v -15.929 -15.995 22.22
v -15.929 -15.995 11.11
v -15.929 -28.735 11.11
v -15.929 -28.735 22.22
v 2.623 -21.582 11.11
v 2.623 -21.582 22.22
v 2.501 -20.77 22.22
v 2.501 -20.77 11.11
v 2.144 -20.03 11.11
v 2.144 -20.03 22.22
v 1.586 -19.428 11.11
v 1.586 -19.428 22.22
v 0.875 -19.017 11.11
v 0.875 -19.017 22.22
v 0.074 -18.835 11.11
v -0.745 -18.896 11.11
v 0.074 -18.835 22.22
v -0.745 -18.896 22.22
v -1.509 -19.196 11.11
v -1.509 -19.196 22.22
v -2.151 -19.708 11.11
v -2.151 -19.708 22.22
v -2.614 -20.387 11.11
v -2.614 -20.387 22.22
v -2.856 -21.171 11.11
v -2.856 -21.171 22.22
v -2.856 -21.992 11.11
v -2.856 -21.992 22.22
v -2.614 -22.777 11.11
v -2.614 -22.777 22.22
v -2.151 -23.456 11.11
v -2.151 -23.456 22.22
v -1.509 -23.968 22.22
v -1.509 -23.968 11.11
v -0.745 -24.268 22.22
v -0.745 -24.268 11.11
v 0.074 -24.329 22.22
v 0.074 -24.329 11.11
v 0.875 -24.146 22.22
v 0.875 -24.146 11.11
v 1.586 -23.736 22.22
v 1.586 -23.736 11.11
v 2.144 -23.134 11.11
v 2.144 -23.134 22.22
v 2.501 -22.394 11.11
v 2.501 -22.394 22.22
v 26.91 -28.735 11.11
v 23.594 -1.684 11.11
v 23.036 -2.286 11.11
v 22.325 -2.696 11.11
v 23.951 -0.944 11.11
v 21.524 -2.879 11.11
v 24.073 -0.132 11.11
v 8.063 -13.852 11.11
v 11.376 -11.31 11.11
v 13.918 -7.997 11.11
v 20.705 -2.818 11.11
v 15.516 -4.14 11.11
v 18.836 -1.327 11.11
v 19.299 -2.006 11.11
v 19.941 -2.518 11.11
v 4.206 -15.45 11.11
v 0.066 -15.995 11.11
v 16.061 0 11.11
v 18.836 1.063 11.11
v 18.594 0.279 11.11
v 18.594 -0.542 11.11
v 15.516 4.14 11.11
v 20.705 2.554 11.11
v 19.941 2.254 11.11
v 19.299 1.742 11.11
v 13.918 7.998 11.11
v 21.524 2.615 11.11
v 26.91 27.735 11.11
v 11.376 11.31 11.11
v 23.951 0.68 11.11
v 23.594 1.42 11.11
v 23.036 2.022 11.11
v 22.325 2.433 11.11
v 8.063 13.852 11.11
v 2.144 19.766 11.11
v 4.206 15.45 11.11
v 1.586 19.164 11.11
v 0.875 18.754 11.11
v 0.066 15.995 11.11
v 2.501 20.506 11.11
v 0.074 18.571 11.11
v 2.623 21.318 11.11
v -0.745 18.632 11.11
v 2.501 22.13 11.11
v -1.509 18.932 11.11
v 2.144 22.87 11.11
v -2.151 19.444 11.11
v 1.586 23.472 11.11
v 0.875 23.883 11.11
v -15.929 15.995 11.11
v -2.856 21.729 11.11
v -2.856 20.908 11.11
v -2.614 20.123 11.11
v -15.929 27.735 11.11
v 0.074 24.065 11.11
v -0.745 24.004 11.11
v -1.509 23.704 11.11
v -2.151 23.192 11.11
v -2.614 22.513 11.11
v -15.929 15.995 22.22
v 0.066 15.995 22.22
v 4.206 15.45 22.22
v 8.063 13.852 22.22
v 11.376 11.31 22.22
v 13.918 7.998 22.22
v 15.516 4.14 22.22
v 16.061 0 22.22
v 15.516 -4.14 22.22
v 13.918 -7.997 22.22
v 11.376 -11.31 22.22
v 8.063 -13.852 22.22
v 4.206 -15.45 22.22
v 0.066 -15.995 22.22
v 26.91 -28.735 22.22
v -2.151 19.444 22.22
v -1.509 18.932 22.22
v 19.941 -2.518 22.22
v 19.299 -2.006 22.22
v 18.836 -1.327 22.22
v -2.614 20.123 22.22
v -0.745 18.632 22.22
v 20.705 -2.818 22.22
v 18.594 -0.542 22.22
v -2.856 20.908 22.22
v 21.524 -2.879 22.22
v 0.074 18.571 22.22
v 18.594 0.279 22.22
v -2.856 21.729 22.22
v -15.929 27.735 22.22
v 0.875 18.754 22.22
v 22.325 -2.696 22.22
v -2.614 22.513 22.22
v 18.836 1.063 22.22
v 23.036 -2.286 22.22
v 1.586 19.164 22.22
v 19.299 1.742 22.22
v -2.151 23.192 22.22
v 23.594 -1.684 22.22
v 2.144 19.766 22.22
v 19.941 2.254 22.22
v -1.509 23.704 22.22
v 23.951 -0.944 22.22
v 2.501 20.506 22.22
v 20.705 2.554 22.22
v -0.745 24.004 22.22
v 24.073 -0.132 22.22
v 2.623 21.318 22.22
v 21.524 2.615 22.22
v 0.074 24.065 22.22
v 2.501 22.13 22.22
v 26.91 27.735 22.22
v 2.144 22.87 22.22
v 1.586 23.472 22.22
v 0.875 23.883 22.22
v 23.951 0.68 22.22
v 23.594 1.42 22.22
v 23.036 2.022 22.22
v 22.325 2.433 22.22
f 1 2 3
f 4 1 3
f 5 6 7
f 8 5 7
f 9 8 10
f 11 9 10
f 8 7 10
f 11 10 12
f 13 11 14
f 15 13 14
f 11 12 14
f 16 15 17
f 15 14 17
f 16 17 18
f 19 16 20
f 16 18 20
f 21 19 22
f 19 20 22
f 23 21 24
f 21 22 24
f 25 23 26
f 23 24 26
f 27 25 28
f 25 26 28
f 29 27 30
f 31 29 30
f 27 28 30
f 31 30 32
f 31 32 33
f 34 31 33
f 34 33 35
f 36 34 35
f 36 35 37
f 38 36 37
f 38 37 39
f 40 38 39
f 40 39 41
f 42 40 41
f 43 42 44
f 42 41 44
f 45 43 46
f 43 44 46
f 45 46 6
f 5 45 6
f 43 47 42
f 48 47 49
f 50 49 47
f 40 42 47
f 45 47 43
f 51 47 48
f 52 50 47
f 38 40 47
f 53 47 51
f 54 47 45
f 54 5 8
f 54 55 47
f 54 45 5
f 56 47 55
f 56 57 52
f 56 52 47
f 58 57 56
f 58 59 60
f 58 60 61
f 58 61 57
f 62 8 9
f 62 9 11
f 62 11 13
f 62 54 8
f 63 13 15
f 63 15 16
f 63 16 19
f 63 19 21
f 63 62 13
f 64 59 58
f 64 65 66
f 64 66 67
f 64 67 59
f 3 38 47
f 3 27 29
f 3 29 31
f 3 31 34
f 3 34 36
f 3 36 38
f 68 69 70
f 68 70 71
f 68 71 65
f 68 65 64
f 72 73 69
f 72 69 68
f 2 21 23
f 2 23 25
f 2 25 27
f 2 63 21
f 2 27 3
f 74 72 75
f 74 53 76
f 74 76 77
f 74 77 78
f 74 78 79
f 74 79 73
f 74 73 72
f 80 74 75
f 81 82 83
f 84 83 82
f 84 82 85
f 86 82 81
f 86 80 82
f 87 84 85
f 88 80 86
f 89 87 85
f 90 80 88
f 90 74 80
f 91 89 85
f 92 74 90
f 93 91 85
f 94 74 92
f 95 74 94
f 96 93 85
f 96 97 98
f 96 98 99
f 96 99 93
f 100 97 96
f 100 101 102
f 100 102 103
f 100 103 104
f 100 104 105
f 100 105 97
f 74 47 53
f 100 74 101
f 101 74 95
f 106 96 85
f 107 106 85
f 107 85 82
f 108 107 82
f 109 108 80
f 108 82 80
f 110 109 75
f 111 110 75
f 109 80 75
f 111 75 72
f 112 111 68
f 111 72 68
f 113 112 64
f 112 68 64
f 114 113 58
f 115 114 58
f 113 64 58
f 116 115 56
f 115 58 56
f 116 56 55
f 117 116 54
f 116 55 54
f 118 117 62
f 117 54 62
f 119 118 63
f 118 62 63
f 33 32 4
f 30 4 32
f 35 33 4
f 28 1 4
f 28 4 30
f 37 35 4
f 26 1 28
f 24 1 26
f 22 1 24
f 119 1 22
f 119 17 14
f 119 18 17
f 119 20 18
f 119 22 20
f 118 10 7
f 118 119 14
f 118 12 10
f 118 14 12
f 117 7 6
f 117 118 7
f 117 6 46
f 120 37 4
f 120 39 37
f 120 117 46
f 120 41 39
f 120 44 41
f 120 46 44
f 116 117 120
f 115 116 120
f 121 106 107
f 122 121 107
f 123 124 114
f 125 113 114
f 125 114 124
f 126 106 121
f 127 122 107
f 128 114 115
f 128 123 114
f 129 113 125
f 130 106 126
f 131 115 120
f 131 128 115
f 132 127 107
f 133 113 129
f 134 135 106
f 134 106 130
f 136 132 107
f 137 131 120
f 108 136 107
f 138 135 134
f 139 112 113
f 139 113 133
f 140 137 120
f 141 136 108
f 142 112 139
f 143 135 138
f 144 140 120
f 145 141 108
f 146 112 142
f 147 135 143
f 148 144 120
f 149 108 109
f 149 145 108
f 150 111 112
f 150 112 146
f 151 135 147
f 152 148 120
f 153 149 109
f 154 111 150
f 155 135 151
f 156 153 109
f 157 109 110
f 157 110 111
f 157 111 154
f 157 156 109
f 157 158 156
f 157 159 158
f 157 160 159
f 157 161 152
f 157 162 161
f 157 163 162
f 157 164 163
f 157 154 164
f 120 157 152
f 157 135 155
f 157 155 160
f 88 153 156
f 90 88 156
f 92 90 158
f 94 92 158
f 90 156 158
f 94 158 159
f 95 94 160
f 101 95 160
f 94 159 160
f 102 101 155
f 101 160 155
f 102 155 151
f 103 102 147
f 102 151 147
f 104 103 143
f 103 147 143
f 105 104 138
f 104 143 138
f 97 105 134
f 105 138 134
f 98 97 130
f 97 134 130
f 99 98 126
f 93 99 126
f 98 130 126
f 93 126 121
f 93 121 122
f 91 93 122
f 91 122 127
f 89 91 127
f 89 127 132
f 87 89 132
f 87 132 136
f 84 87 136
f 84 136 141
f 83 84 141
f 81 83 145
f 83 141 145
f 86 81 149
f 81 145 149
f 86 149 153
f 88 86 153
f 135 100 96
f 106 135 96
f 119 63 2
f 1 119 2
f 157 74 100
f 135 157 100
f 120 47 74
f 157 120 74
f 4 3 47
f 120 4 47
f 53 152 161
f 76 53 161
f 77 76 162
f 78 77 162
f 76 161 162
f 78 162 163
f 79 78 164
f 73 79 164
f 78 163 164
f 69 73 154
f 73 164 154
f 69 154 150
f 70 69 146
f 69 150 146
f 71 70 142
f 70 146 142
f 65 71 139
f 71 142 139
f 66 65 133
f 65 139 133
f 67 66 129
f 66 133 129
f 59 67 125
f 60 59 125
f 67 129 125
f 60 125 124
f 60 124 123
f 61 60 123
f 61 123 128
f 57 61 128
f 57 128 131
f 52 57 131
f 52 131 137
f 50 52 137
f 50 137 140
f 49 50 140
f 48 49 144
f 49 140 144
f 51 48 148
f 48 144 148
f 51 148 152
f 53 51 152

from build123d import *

# Parameters (mm, degrees)
ESBO_O1_W                = 53.82
ESBO_O1_H                = 57.47
RESSALTO_EXTRUS_O1_DEPTH = 11.11
RESSALTO_EXTRUS_O2_DEPTH = 11.11
ESBO_O4_R                = 2.755
CORTE_EXTRUS_O2_DEPTH    = 11.11
ESBO_O3_W                = 53.82
ESBO_O3_H                = 57.47
CORTE_EXTRUS_O3_DEPTH    = 11.11
ESBO_O5_W                = 42.839074837
ESBO_O5_H                = 1
CORTE_EXTRUS_O4_DEPTH    = 11.11


with BuildPart() as part:
    # Esboço1 → Ressalto-extrusão1 (new body)
    with BuildSketch(Plane.XY):
        Rectangle(ESBO_O1_W, ESBO_O1_H)
    extrude(amount=RESSALTO_EXTRUS_O1_DEPTH)

    # Esboço2 → Ressalto-extrusão2 (add)
    with BuildSketch(Plane.XY.offset(11.11)):
        with BuildLine():
            Line((0.065925163, -15.995), (-15.929074837, -15.995))
            Line((-15.929074837, -15.995), (-15.929074837, -28.735))
            Line((-15.929074837, -28.735), (0, -28.735))
            Line((0, -28.735), (26.91, -28.735))
            Line((26.91, -28.735), (26.91, 28.735))
            Line((26.91, 28.735), (0, 28.735))
            Line((0, 28.735), (-15.929074837, 28.735))
            Line((-15.929074837, 28.735), (-15.929074837, 15.995))
            Line((-15.929074837, 15.995), (0.065925163, 15.995))
            ThreePointArc((0.065925163, 15.995), (16.060925163, 0), (0.065925163, -15.995))
        make_face()
    extrude(amount=RESSALTO_EXTRUS_O2_DEPTH)

    # Esboço4 → Corte-extrusão2 (cut)
    with BuildSketch(Plane.XY.offset(22.22)):
        with Locations((21.318136928, -0.131850449)):
            Circle(ESBO_O4_R)
        with Locations((-0.131863072, -21.581850449)):
            Circle(ESBO_O4_R)
        with Locations((-0.131863072, 21.318149551)):
            Circle(ESBO_O4_R)
    extrude(amount=-CORTE_EXTRUS_O2_DEPTH, mode=Mode.SUBTRACT)

    # Esboço3 → Corte-extrusão3 (cut)
    with BuildSketch(Plane(origin=(0, 0, 0), x_dir=(-1, 0, 0), z_dir=(0, 0, -1))):
        Rectangle(ESBO_O3_W, ESBO_O3_H)
    extrude(amount=-CORTE_EXTRUS_O3_DEPTH, mode=Mode.SUBTRACT)

    # Esboço5 → Corte-extrusão4 (cut)
    with BuildSketch(Plane(origin=(0, 0, 11.11), x_dir=(-1, 0, 0), z_dir=(0, 0, -1))):
        with Locations((-5.490462581, 28.235)):
            Rectangle(ESBO_O5_W, ESBO_O5_H)
    extrude(amount=-CORTE_EXTRUS_O4_DEPTH, mode=Mode.SUBTRACT)


solid = part.part
